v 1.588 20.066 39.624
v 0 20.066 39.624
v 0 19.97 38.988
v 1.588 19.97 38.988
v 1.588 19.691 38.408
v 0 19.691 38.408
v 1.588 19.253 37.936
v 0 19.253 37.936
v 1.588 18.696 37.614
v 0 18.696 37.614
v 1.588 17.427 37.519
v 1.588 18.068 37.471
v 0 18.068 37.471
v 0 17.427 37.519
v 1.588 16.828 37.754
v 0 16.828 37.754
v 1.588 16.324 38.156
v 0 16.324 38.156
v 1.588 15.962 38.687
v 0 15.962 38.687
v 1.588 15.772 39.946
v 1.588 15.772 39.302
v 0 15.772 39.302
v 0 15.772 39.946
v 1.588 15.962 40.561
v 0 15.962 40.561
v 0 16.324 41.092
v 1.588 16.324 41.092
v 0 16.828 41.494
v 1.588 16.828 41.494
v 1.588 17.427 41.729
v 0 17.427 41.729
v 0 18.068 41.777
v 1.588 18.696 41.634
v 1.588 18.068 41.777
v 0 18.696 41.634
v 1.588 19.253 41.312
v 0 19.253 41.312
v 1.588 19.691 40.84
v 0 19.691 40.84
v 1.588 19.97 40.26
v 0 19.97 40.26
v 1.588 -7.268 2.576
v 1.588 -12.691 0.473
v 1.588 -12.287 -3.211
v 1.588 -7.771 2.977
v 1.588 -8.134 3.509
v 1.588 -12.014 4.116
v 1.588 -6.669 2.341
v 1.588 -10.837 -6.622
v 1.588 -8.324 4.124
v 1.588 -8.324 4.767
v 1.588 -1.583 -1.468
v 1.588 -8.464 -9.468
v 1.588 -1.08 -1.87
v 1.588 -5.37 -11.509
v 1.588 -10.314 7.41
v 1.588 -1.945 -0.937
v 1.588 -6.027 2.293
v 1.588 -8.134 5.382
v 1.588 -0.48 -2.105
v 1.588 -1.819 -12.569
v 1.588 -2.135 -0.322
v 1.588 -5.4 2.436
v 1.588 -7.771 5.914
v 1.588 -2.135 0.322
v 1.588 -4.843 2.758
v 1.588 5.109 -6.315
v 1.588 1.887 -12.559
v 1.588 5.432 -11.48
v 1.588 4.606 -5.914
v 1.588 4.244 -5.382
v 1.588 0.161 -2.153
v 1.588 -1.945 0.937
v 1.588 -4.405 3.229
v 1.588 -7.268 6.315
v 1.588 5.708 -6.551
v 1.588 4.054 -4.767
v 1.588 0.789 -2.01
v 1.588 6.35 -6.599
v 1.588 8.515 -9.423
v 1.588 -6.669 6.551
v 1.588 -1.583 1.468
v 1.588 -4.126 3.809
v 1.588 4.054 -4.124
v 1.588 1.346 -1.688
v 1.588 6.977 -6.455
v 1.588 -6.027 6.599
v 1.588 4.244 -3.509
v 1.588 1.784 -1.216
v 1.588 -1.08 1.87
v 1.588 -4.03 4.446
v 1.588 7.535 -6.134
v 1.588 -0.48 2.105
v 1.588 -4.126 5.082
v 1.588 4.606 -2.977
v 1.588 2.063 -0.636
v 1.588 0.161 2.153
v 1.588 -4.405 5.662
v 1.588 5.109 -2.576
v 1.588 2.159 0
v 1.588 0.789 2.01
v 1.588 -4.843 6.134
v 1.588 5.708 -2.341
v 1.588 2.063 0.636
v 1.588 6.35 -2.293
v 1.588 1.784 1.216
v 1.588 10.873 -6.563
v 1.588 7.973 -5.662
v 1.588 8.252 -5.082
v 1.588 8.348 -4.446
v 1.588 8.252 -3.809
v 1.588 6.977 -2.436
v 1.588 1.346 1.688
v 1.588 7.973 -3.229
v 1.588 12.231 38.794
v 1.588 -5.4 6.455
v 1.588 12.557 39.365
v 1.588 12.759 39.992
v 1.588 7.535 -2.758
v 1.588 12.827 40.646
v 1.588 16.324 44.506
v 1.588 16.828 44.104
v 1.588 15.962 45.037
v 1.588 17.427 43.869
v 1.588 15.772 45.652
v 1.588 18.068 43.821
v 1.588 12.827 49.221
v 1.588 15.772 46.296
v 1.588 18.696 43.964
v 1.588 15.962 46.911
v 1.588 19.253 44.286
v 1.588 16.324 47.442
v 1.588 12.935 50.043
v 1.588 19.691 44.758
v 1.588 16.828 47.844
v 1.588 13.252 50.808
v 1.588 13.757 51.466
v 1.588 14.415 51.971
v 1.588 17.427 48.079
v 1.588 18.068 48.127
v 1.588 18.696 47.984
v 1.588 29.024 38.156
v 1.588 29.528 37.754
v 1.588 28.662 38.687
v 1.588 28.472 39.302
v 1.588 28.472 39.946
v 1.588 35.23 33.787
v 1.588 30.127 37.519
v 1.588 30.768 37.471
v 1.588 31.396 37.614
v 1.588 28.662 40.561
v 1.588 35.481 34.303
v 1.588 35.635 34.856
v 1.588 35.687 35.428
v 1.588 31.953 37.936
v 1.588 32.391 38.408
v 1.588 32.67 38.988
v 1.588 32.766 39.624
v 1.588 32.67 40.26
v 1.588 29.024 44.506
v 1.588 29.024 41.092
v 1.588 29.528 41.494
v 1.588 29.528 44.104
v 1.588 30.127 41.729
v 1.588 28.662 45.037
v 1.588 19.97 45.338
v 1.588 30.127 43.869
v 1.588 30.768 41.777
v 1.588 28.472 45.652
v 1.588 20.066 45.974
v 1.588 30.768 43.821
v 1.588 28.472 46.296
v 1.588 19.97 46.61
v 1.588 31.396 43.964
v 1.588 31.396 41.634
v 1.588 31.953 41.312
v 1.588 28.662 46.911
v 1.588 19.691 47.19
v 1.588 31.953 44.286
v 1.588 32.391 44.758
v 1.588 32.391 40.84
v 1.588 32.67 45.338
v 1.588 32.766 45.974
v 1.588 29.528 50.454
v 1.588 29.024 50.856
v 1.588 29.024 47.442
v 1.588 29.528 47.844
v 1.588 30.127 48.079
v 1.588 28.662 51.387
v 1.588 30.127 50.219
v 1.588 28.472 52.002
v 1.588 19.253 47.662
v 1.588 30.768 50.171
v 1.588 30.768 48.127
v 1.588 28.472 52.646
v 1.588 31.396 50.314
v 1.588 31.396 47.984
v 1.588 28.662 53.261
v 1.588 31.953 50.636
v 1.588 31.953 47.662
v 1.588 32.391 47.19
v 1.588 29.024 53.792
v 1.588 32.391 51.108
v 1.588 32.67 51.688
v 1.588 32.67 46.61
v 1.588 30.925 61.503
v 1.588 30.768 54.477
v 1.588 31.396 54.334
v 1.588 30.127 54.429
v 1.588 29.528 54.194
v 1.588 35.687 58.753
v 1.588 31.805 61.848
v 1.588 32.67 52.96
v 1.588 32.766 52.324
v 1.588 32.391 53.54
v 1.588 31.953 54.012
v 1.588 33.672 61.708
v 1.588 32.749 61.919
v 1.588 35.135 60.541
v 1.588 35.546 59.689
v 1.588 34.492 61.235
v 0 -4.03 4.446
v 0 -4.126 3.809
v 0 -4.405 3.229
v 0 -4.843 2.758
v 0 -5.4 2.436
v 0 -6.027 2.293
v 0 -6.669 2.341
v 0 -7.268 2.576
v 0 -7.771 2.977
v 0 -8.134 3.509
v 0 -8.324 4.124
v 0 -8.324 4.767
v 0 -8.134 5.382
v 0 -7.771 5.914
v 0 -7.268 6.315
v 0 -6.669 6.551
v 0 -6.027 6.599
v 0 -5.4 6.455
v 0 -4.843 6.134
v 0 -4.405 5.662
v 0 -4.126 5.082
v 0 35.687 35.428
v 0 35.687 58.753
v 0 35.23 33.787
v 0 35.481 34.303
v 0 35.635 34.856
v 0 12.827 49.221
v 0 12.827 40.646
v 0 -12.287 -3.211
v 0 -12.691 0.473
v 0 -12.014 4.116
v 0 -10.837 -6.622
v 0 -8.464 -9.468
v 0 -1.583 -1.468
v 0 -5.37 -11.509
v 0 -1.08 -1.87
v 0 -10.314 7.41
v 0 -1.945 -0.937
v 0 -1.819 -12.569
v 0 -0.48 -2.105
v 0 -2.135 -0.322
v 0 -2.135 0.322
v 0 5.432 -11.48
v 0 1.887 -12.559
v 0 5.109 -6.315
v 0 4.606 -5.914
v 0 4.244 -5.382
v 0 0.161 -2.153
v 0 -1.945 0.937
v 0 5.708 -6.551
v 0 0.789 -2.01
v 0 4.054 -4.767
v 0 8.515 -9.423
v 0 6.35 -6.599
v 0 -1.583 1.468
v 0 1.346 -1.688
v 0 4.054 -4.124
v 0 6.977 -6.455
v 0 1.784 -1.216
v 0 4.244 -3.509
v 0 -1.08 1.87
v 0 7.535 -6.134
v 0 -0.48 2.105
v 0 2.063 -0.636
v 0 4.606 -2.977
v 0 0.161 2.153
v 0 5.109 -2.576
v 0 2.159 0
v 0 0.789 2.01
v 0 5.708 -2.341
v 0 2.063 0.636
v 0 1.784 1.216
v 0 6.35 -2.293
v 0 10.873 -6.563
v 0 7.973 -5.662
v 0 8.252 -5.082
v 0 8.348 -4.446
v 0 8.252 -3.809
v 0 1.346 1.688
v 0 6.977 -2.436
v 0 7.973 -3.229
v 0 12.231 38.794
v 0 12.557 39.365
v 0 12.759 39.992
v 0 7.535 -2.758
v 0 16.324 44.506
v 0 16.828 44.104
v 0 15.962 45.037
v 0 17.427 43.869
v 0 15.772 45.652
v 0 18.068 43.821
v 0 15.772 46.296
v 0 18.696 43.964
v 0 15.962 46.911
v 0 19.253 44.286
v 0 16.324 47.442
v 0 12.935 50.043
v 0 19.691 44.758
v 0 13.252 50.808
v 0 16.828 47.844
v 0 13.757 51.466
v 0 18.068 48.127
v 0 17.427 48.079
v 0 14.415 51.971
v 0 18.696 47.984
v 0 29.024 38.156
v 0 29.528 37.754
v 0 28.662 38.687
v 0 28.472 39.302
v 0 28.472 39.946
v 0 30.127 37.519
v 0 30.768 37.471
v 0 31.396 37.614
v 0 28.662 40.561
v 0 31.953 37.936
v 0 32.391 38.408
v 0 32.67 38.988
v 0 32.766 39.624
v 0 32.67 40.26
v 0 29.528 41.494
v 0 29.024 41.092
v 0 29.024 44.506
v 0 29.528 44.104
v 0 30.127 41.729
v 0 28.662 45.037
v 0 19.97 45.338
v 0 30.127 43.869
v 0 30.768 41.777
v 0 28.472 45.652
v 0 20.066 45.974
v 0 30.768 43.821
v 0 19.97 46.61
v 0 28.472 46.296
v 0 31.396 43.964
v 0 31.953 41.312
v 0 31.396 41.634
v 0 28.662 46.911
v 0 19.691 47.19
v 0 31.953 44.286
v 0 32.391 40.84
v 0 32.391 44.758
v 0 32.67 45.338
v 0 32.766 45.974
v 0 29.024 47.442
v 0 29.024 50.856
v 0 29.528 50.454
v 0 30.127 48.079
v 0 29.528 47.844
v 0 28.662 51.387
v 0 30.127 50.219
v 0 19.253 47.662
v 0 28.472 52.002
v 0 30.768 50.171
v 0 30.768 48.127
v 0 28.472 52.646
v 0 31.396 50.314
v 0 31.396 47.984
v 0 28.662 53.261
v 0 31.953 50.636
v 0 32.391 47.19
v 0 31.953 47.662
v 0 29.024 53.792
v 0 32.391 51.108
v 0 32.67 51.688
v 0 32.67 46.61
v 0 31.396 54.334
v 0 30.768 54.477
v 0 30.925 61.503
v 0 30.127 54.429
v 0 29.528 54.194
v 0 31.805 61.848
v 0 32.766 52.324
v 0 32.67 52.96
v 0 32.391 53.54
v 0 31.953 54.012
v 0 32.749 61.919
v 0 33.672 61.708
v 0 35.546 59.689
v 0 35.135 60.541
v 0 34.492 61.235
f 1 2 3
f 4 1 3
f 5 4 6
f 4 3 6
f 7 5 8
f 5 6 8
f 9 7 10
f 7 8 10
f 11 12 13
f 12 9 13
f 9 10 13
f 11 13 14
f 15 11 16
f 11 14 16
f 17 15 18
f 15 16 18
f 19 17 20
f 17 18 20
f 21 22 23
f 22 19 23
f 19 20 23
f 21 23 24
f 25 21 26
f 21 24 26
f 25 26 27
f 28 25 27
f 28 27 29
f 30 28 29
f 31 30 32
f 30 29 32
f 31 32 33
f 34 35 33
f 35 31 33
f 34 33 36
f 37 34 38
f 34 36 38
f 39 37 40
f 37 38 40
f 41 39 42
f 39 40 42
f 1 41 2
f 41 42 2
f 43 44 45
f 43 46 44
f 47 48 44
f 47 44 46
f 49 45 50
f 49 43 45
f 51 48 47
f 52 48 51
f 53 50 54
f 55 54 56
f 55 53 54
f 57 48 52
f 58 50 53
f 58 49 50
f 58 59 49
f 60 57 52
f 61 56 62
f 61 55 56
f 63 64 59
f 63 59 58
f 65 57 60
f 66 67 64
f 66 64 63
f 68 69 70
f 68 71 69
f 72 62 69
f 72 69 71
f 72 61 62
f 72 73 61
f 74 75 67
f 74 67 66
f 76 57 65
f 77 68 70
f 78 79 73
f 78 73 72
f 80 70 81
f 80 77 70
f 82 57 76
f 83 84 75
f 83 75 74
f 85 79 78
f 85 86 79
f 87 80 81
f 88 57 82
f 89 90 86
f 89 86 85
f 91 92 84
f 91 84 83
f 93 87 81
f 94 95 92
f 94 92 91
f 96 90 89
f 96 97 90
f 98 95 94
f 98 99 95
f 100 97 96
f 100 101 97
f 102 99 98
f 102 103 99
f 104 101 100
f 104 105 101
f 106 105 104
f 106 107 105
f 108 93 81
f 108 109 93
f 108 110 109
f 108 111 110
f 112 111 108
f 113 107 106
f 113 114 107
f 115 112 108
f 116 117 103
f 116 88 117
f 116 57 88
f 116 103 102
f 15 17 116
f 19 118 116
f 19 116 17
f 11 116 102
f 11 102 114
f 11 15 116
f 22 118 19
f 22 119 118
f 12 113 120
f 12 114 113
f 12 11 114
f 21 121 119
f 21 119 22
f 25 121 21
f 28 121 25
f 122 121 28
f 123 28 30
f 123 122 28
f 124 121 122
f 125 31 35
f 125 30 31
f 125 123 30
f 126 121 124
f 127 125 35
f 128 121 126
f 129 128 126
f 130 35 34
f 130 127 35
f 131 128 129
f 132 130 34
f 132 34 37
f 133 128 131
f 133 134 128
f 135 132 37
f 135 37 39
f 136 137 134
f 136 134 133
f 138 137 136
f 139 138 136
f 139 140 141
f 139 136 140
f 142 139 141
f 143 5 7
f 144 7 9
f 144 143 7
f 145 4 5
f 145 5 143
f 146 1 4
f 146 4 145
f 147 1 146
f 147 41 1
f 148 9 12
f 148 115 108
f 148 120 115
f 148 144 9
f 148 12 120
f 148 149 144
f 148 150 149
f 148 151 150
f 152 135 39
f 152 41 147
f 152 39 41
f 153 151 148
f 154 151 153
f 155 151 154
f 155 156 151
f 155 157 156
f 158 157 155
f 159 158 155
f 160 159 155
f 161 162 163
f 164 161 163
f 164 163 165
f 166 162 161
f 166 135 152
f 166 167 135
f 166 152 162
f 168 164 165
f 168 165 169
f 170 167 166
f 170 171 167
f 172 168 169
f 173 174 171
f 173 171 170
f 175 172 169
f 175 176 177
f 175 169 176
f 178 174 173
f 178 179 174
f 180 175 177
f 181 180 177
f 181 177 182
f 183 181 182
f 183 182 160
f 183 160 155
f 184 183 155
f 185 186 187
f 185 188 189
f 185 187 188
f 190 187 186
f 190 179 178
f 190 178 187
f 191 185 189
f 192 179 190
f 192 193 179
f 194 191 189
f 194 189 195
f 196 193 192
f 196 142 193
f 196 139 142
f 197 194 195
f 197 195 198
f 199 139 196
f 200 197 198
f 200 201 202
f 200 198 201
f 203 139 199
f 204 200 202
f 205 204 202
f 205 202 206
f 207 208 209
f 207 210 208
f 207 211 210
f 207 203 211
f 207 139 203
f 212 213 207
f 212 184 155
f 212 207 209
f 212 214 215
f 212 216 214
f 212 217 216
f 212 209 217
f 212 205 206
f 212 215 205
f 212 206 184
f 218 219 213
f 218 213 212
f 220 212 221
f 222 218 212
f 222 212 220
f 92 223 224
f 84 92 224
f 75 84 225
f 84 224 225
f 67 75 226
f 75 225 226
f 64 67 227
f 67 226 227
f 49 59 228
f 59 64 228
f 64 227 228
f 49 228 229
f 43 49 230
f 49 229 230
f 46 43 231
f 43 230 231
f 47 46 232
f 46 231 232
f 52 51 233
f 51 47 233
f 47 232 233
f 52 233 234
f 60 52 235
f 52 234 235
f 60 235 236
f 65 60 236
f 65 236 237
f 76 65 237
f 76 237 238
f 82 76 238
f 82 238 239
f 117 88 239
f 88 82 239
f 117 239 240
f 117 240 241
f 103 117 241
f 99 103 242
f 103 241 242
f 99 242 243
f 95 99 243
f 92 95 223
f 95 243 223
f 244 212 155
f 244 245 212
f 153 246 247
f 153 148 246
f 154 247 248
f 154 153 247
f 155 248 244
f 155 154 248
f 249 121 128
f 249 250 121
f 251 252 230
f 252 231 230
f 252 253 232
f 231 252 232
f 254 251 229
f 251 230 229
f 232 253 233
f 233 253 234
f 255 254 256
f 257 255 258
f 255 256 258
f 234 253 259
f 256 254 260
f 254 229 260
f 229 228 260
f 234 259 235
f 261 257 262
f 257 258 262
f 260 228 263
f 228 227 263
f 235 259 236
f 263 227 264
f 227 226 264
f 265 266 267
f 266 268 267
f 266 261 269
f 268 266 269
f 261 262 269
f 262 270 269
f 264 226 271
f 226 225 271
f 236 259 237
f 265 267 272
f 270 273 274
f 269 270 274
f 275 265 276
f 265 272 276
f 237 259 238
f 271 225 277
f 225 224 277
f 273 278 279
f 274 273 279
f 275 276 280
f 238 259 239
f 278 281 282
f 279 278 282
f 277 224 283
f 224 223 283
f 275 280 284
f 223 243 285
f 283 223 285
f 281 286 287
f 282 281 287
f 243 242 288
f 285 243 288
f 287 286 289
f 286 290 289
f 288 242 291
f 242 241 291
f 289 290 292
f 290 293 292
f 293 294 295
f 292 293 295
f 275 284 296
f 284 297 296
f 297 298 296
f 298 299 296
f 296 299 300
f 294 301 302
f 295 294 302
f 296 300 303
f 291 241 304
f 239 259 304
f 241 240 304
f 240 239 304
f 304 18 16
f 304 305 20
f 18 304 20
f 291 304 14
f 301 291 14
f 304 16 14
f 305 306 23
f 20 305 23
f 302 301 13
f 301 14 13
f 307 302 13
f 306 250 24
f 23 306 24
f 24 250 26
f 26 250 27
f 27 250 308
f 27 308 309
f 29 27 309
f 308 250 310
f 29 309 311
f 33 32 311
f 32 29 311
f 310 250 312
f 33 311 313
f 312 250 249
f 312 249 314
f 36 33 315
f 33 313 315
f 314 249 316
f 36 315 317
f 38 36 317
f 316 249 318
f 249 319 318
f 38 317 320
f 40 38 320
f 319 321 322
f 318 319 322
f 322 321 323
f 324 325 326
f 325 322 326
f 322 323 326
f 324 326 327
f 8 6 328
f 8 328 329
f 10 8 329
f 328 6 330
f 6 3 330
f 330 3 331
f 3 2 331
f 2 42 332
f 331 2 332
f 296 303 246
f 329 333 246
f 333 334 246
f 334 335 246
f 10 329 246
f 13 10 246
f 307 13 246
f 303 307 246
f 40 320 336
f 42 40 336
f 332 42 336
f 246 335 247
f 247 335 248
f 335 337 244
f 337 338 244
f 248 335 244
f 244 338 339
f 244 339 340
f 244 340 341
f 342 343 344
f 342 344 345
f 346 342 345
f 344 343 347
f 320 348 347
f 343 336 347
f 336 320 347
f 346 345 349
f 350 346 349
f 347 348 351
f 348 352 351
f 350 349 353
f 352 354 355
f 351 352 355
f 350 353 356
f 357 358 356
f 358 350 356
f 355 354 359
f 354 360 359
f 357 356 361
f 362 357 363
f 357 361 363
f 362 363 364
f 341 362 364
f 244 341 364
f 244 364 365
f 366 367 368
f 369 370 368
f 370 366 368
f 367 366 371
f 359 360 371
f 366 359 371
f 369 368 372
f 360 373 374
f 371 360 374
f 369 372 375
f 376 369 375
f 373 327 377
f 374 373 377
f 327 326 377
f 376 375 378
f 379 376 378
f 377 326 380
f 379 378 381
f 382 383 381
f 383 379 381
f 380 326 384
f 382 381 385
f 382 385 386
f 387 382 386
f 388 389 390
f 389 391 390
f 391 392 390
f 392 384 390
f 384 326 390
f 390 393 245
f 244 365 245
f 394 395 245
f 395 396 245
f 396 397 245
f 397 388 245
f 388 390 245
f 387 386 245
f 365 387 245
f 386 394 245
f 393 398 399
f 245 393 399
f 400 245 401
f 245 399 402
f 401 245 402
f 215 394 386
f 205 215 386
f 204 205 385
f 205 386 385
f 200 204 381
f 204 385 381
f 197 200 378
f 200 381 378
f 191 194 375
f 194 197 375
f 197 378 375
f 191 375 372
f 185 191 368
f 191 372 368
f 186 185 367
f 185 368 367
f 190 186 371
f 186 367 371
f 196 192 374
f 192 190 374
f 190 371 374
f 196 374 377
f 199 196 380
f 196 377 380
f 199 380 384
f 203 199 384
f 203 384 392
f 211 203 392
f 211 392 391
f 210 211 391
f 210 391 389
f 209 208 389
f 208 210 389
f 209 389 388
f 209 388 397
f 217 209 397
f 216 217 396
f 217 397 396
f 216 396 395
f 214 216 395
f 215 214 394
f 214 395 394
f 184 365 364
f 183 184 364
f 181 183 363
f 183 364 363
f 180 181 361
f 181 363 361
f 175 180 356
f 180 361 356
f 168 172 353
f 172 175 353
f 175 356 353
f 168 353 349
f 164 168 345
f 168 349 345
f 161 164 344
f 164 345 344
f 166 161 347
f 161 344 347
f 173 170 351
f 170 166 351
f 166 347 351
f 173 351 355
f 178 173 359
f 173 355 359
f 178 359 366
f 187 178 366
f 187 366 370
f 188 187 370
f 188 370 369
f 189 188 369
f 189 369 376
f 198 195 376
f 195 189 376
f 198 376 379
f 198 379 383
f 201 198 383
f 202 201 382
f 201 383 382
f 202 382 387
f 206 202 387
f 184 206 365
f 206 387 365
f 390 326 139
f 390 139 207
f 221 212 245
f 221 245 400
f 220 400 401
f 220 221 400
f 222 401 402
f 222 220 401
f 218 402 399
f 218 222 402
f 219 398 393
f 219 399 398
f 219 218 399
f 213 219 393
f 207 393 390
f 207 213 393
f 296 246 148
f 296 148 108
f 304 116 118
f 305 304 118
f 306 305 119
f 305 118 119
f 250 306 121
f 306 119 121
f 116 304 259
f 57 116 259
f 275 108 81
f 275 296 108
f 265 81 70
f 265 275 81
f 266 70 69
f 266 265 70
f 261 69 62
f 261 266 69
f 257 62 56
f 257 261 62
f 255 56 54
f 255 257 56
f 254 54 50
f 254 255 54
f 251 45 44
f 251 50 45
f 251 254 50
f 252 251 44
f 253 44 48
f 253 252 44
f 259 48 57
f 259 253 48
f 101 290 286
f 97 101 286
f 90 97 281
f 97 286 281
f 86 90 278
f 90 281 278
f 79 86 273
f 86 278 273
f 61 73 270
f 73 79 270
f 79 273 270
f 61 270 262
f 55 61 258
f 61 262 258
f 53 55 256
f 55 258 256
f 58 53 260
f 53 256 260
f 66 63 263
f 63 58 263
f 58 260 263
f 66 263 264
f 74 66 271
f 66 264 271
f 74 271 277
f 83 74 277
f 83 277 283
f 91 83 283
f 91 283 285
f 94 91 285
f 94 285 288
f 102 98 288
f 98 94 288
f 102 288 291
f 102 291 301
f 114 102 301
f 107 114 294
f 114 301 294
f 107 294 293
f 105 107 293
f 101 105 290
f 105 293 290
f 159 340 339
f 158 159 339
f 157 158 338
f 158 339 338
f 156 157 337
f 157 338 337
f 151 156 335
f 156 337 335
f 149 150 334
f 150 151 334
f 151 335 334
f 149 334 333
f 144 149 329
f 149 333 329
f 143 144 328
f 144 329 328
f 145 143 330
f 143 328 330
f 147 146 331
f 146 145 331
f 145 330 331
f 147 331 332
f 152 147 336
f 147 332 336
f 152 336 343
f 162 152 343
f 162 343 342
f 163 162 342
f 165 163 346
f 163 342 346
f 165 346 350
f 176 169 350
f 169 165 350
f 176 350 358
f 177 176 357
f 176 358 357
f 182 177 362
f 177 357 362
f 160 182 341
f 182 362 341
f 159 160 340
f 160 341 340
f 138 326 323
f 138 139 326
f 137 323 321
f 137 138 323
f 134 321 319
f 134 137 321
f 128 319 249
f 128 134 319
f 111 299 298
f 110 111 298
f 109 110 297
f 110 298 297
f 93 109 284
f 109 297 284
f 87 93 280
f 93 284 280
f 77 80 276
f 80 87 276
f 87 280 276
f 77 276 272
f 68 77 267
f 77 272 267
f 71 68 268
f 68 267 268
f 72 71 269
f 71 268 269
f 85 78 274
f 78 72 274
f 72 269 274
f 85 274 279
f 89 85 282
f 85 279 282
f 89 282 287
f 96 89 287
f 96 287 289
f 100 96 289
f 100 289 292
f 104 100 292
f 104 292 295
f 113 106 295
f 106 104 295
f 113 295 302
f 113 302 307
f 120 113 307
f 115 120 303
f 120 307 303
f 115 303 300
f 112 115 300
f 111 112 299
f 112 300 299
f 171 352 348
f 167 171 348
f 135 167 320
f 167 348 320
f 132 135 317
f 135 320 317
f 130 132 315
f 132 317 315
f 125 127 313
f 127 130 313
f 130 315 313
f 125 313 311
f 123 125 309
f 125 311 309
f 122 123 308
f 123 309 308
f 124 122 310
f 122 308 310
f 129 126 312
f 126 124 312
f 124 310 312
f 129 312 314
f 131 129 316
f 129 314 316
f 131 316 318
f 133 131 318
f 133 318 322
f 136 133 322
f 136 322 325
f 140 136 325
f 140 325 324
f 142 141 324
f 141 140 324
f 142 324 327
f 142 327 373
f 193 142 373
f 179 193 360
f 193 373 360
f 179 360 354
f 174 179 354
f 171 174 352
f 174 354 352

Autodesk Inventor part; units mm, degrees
ref_plane "YZ Plane" through (0, 0, 0) normal (1, 0, 0) x (0, 1, 0)
ref_plane "XZ Plane" through (0, 0, 0) normal (0, 1, 0) x (-1, 0, 0)
ref_plane "XY Plane" through (0, 0, 0) normal (0, 0, 1) x (1, 0, 0)
sketch "Sketch1" plane through (0, 0, 0) normal (1, 0, 0) x (0, 1, 0)
  circle A0 centre (0, 0) radius 2.159
  line L0 (0, 0) -> (0, 39.624) construction
  line L1 (0, 39.624) -> (12.827, 39.624) construction
  line L2 (12.827, 39.624) -> (12.827, 51.054)
  circle A1 centre (0, 0) radius 12.7
  line L3 (12.827, 39.624) -> (-10.3145, 7.4095)
  line L4 (12.827, 51.054) -> (35.687, 51.054) construction
  line L5 (35.687, 51.054) -> (35.687, 34.544)
  line L6 (35.687, 34.544) -> (12.827, 34.544) construction
  line L7 (12.827, 34.544) -> (12.827, 51.054)
  line L8 (35.687, 34.544) -> (10.8726, -6.5633)
  circle A2 centre (30.607, 45.974) radius 2.159
  line L9 (30.607, 45.974) -> (30.607, 33.274) construction
  line L10 (30.607, 45.974) -> (17.907, 45.974) construction
  circle A3 centre (30.607, 39.624) radius 2.159
  circle A4 centre (17.907, 45.974) radius 2.159
  circle A5 centre (17.907, 39.624) radius 2.159
  line L11 (12.827, 51.054) -> (35.687, 64.2522)
  line L12 (35.687, 64.2522) -> (35.687, 51.054)
  circle A6 centre (30.607, 52.324) radius 2.159
  circle A7 centre (6.1887, -4.4457) radius 2.159
  line L13 (0, 0) -> (6.1887, -4.4457) construction
  circle A8 centre (0, 0) radius 7.62 construction
  circle A9 centre (-6.1887, 4.4457) radius 2.159
  dimension "d29" = 15.24
  dimension "d0" = 4.318
  dimension "d1" = 39.624
  dimension "d2" = 11.43
  dimension "d3" = 12.827
  dimension "d5" = 25.4
  dimension "d6" = 22.86
  dimension "d7" = 16.51
  dimension "d8" = 4.318
  dimension "d9" = 5.08
  dimension "d10" = 5.08
  dimension "d11" = 12.7
  dimension "d12" = 12.7
  dimension "d15" = 6.35
  dimension "d18" = 12.7
  dimension "d21" = 30
  dimension "d22" = 6.35
  dimension "d26" = 4.318
  dimension "d32" = 360
extrude "Extrusion1" add sketch "Sketch1" along normal blind 1.5875
fillet "Fillet1" radius 3.175 4 edges at (0.7937, 12.827, 39.624) (0.7937, 35.687, 34.544) (0.7937, 35.687, 64.2522) (0.7937, 12.827, 51.054)
properties part number "IntakeArm" material "Aluminum 6061"
